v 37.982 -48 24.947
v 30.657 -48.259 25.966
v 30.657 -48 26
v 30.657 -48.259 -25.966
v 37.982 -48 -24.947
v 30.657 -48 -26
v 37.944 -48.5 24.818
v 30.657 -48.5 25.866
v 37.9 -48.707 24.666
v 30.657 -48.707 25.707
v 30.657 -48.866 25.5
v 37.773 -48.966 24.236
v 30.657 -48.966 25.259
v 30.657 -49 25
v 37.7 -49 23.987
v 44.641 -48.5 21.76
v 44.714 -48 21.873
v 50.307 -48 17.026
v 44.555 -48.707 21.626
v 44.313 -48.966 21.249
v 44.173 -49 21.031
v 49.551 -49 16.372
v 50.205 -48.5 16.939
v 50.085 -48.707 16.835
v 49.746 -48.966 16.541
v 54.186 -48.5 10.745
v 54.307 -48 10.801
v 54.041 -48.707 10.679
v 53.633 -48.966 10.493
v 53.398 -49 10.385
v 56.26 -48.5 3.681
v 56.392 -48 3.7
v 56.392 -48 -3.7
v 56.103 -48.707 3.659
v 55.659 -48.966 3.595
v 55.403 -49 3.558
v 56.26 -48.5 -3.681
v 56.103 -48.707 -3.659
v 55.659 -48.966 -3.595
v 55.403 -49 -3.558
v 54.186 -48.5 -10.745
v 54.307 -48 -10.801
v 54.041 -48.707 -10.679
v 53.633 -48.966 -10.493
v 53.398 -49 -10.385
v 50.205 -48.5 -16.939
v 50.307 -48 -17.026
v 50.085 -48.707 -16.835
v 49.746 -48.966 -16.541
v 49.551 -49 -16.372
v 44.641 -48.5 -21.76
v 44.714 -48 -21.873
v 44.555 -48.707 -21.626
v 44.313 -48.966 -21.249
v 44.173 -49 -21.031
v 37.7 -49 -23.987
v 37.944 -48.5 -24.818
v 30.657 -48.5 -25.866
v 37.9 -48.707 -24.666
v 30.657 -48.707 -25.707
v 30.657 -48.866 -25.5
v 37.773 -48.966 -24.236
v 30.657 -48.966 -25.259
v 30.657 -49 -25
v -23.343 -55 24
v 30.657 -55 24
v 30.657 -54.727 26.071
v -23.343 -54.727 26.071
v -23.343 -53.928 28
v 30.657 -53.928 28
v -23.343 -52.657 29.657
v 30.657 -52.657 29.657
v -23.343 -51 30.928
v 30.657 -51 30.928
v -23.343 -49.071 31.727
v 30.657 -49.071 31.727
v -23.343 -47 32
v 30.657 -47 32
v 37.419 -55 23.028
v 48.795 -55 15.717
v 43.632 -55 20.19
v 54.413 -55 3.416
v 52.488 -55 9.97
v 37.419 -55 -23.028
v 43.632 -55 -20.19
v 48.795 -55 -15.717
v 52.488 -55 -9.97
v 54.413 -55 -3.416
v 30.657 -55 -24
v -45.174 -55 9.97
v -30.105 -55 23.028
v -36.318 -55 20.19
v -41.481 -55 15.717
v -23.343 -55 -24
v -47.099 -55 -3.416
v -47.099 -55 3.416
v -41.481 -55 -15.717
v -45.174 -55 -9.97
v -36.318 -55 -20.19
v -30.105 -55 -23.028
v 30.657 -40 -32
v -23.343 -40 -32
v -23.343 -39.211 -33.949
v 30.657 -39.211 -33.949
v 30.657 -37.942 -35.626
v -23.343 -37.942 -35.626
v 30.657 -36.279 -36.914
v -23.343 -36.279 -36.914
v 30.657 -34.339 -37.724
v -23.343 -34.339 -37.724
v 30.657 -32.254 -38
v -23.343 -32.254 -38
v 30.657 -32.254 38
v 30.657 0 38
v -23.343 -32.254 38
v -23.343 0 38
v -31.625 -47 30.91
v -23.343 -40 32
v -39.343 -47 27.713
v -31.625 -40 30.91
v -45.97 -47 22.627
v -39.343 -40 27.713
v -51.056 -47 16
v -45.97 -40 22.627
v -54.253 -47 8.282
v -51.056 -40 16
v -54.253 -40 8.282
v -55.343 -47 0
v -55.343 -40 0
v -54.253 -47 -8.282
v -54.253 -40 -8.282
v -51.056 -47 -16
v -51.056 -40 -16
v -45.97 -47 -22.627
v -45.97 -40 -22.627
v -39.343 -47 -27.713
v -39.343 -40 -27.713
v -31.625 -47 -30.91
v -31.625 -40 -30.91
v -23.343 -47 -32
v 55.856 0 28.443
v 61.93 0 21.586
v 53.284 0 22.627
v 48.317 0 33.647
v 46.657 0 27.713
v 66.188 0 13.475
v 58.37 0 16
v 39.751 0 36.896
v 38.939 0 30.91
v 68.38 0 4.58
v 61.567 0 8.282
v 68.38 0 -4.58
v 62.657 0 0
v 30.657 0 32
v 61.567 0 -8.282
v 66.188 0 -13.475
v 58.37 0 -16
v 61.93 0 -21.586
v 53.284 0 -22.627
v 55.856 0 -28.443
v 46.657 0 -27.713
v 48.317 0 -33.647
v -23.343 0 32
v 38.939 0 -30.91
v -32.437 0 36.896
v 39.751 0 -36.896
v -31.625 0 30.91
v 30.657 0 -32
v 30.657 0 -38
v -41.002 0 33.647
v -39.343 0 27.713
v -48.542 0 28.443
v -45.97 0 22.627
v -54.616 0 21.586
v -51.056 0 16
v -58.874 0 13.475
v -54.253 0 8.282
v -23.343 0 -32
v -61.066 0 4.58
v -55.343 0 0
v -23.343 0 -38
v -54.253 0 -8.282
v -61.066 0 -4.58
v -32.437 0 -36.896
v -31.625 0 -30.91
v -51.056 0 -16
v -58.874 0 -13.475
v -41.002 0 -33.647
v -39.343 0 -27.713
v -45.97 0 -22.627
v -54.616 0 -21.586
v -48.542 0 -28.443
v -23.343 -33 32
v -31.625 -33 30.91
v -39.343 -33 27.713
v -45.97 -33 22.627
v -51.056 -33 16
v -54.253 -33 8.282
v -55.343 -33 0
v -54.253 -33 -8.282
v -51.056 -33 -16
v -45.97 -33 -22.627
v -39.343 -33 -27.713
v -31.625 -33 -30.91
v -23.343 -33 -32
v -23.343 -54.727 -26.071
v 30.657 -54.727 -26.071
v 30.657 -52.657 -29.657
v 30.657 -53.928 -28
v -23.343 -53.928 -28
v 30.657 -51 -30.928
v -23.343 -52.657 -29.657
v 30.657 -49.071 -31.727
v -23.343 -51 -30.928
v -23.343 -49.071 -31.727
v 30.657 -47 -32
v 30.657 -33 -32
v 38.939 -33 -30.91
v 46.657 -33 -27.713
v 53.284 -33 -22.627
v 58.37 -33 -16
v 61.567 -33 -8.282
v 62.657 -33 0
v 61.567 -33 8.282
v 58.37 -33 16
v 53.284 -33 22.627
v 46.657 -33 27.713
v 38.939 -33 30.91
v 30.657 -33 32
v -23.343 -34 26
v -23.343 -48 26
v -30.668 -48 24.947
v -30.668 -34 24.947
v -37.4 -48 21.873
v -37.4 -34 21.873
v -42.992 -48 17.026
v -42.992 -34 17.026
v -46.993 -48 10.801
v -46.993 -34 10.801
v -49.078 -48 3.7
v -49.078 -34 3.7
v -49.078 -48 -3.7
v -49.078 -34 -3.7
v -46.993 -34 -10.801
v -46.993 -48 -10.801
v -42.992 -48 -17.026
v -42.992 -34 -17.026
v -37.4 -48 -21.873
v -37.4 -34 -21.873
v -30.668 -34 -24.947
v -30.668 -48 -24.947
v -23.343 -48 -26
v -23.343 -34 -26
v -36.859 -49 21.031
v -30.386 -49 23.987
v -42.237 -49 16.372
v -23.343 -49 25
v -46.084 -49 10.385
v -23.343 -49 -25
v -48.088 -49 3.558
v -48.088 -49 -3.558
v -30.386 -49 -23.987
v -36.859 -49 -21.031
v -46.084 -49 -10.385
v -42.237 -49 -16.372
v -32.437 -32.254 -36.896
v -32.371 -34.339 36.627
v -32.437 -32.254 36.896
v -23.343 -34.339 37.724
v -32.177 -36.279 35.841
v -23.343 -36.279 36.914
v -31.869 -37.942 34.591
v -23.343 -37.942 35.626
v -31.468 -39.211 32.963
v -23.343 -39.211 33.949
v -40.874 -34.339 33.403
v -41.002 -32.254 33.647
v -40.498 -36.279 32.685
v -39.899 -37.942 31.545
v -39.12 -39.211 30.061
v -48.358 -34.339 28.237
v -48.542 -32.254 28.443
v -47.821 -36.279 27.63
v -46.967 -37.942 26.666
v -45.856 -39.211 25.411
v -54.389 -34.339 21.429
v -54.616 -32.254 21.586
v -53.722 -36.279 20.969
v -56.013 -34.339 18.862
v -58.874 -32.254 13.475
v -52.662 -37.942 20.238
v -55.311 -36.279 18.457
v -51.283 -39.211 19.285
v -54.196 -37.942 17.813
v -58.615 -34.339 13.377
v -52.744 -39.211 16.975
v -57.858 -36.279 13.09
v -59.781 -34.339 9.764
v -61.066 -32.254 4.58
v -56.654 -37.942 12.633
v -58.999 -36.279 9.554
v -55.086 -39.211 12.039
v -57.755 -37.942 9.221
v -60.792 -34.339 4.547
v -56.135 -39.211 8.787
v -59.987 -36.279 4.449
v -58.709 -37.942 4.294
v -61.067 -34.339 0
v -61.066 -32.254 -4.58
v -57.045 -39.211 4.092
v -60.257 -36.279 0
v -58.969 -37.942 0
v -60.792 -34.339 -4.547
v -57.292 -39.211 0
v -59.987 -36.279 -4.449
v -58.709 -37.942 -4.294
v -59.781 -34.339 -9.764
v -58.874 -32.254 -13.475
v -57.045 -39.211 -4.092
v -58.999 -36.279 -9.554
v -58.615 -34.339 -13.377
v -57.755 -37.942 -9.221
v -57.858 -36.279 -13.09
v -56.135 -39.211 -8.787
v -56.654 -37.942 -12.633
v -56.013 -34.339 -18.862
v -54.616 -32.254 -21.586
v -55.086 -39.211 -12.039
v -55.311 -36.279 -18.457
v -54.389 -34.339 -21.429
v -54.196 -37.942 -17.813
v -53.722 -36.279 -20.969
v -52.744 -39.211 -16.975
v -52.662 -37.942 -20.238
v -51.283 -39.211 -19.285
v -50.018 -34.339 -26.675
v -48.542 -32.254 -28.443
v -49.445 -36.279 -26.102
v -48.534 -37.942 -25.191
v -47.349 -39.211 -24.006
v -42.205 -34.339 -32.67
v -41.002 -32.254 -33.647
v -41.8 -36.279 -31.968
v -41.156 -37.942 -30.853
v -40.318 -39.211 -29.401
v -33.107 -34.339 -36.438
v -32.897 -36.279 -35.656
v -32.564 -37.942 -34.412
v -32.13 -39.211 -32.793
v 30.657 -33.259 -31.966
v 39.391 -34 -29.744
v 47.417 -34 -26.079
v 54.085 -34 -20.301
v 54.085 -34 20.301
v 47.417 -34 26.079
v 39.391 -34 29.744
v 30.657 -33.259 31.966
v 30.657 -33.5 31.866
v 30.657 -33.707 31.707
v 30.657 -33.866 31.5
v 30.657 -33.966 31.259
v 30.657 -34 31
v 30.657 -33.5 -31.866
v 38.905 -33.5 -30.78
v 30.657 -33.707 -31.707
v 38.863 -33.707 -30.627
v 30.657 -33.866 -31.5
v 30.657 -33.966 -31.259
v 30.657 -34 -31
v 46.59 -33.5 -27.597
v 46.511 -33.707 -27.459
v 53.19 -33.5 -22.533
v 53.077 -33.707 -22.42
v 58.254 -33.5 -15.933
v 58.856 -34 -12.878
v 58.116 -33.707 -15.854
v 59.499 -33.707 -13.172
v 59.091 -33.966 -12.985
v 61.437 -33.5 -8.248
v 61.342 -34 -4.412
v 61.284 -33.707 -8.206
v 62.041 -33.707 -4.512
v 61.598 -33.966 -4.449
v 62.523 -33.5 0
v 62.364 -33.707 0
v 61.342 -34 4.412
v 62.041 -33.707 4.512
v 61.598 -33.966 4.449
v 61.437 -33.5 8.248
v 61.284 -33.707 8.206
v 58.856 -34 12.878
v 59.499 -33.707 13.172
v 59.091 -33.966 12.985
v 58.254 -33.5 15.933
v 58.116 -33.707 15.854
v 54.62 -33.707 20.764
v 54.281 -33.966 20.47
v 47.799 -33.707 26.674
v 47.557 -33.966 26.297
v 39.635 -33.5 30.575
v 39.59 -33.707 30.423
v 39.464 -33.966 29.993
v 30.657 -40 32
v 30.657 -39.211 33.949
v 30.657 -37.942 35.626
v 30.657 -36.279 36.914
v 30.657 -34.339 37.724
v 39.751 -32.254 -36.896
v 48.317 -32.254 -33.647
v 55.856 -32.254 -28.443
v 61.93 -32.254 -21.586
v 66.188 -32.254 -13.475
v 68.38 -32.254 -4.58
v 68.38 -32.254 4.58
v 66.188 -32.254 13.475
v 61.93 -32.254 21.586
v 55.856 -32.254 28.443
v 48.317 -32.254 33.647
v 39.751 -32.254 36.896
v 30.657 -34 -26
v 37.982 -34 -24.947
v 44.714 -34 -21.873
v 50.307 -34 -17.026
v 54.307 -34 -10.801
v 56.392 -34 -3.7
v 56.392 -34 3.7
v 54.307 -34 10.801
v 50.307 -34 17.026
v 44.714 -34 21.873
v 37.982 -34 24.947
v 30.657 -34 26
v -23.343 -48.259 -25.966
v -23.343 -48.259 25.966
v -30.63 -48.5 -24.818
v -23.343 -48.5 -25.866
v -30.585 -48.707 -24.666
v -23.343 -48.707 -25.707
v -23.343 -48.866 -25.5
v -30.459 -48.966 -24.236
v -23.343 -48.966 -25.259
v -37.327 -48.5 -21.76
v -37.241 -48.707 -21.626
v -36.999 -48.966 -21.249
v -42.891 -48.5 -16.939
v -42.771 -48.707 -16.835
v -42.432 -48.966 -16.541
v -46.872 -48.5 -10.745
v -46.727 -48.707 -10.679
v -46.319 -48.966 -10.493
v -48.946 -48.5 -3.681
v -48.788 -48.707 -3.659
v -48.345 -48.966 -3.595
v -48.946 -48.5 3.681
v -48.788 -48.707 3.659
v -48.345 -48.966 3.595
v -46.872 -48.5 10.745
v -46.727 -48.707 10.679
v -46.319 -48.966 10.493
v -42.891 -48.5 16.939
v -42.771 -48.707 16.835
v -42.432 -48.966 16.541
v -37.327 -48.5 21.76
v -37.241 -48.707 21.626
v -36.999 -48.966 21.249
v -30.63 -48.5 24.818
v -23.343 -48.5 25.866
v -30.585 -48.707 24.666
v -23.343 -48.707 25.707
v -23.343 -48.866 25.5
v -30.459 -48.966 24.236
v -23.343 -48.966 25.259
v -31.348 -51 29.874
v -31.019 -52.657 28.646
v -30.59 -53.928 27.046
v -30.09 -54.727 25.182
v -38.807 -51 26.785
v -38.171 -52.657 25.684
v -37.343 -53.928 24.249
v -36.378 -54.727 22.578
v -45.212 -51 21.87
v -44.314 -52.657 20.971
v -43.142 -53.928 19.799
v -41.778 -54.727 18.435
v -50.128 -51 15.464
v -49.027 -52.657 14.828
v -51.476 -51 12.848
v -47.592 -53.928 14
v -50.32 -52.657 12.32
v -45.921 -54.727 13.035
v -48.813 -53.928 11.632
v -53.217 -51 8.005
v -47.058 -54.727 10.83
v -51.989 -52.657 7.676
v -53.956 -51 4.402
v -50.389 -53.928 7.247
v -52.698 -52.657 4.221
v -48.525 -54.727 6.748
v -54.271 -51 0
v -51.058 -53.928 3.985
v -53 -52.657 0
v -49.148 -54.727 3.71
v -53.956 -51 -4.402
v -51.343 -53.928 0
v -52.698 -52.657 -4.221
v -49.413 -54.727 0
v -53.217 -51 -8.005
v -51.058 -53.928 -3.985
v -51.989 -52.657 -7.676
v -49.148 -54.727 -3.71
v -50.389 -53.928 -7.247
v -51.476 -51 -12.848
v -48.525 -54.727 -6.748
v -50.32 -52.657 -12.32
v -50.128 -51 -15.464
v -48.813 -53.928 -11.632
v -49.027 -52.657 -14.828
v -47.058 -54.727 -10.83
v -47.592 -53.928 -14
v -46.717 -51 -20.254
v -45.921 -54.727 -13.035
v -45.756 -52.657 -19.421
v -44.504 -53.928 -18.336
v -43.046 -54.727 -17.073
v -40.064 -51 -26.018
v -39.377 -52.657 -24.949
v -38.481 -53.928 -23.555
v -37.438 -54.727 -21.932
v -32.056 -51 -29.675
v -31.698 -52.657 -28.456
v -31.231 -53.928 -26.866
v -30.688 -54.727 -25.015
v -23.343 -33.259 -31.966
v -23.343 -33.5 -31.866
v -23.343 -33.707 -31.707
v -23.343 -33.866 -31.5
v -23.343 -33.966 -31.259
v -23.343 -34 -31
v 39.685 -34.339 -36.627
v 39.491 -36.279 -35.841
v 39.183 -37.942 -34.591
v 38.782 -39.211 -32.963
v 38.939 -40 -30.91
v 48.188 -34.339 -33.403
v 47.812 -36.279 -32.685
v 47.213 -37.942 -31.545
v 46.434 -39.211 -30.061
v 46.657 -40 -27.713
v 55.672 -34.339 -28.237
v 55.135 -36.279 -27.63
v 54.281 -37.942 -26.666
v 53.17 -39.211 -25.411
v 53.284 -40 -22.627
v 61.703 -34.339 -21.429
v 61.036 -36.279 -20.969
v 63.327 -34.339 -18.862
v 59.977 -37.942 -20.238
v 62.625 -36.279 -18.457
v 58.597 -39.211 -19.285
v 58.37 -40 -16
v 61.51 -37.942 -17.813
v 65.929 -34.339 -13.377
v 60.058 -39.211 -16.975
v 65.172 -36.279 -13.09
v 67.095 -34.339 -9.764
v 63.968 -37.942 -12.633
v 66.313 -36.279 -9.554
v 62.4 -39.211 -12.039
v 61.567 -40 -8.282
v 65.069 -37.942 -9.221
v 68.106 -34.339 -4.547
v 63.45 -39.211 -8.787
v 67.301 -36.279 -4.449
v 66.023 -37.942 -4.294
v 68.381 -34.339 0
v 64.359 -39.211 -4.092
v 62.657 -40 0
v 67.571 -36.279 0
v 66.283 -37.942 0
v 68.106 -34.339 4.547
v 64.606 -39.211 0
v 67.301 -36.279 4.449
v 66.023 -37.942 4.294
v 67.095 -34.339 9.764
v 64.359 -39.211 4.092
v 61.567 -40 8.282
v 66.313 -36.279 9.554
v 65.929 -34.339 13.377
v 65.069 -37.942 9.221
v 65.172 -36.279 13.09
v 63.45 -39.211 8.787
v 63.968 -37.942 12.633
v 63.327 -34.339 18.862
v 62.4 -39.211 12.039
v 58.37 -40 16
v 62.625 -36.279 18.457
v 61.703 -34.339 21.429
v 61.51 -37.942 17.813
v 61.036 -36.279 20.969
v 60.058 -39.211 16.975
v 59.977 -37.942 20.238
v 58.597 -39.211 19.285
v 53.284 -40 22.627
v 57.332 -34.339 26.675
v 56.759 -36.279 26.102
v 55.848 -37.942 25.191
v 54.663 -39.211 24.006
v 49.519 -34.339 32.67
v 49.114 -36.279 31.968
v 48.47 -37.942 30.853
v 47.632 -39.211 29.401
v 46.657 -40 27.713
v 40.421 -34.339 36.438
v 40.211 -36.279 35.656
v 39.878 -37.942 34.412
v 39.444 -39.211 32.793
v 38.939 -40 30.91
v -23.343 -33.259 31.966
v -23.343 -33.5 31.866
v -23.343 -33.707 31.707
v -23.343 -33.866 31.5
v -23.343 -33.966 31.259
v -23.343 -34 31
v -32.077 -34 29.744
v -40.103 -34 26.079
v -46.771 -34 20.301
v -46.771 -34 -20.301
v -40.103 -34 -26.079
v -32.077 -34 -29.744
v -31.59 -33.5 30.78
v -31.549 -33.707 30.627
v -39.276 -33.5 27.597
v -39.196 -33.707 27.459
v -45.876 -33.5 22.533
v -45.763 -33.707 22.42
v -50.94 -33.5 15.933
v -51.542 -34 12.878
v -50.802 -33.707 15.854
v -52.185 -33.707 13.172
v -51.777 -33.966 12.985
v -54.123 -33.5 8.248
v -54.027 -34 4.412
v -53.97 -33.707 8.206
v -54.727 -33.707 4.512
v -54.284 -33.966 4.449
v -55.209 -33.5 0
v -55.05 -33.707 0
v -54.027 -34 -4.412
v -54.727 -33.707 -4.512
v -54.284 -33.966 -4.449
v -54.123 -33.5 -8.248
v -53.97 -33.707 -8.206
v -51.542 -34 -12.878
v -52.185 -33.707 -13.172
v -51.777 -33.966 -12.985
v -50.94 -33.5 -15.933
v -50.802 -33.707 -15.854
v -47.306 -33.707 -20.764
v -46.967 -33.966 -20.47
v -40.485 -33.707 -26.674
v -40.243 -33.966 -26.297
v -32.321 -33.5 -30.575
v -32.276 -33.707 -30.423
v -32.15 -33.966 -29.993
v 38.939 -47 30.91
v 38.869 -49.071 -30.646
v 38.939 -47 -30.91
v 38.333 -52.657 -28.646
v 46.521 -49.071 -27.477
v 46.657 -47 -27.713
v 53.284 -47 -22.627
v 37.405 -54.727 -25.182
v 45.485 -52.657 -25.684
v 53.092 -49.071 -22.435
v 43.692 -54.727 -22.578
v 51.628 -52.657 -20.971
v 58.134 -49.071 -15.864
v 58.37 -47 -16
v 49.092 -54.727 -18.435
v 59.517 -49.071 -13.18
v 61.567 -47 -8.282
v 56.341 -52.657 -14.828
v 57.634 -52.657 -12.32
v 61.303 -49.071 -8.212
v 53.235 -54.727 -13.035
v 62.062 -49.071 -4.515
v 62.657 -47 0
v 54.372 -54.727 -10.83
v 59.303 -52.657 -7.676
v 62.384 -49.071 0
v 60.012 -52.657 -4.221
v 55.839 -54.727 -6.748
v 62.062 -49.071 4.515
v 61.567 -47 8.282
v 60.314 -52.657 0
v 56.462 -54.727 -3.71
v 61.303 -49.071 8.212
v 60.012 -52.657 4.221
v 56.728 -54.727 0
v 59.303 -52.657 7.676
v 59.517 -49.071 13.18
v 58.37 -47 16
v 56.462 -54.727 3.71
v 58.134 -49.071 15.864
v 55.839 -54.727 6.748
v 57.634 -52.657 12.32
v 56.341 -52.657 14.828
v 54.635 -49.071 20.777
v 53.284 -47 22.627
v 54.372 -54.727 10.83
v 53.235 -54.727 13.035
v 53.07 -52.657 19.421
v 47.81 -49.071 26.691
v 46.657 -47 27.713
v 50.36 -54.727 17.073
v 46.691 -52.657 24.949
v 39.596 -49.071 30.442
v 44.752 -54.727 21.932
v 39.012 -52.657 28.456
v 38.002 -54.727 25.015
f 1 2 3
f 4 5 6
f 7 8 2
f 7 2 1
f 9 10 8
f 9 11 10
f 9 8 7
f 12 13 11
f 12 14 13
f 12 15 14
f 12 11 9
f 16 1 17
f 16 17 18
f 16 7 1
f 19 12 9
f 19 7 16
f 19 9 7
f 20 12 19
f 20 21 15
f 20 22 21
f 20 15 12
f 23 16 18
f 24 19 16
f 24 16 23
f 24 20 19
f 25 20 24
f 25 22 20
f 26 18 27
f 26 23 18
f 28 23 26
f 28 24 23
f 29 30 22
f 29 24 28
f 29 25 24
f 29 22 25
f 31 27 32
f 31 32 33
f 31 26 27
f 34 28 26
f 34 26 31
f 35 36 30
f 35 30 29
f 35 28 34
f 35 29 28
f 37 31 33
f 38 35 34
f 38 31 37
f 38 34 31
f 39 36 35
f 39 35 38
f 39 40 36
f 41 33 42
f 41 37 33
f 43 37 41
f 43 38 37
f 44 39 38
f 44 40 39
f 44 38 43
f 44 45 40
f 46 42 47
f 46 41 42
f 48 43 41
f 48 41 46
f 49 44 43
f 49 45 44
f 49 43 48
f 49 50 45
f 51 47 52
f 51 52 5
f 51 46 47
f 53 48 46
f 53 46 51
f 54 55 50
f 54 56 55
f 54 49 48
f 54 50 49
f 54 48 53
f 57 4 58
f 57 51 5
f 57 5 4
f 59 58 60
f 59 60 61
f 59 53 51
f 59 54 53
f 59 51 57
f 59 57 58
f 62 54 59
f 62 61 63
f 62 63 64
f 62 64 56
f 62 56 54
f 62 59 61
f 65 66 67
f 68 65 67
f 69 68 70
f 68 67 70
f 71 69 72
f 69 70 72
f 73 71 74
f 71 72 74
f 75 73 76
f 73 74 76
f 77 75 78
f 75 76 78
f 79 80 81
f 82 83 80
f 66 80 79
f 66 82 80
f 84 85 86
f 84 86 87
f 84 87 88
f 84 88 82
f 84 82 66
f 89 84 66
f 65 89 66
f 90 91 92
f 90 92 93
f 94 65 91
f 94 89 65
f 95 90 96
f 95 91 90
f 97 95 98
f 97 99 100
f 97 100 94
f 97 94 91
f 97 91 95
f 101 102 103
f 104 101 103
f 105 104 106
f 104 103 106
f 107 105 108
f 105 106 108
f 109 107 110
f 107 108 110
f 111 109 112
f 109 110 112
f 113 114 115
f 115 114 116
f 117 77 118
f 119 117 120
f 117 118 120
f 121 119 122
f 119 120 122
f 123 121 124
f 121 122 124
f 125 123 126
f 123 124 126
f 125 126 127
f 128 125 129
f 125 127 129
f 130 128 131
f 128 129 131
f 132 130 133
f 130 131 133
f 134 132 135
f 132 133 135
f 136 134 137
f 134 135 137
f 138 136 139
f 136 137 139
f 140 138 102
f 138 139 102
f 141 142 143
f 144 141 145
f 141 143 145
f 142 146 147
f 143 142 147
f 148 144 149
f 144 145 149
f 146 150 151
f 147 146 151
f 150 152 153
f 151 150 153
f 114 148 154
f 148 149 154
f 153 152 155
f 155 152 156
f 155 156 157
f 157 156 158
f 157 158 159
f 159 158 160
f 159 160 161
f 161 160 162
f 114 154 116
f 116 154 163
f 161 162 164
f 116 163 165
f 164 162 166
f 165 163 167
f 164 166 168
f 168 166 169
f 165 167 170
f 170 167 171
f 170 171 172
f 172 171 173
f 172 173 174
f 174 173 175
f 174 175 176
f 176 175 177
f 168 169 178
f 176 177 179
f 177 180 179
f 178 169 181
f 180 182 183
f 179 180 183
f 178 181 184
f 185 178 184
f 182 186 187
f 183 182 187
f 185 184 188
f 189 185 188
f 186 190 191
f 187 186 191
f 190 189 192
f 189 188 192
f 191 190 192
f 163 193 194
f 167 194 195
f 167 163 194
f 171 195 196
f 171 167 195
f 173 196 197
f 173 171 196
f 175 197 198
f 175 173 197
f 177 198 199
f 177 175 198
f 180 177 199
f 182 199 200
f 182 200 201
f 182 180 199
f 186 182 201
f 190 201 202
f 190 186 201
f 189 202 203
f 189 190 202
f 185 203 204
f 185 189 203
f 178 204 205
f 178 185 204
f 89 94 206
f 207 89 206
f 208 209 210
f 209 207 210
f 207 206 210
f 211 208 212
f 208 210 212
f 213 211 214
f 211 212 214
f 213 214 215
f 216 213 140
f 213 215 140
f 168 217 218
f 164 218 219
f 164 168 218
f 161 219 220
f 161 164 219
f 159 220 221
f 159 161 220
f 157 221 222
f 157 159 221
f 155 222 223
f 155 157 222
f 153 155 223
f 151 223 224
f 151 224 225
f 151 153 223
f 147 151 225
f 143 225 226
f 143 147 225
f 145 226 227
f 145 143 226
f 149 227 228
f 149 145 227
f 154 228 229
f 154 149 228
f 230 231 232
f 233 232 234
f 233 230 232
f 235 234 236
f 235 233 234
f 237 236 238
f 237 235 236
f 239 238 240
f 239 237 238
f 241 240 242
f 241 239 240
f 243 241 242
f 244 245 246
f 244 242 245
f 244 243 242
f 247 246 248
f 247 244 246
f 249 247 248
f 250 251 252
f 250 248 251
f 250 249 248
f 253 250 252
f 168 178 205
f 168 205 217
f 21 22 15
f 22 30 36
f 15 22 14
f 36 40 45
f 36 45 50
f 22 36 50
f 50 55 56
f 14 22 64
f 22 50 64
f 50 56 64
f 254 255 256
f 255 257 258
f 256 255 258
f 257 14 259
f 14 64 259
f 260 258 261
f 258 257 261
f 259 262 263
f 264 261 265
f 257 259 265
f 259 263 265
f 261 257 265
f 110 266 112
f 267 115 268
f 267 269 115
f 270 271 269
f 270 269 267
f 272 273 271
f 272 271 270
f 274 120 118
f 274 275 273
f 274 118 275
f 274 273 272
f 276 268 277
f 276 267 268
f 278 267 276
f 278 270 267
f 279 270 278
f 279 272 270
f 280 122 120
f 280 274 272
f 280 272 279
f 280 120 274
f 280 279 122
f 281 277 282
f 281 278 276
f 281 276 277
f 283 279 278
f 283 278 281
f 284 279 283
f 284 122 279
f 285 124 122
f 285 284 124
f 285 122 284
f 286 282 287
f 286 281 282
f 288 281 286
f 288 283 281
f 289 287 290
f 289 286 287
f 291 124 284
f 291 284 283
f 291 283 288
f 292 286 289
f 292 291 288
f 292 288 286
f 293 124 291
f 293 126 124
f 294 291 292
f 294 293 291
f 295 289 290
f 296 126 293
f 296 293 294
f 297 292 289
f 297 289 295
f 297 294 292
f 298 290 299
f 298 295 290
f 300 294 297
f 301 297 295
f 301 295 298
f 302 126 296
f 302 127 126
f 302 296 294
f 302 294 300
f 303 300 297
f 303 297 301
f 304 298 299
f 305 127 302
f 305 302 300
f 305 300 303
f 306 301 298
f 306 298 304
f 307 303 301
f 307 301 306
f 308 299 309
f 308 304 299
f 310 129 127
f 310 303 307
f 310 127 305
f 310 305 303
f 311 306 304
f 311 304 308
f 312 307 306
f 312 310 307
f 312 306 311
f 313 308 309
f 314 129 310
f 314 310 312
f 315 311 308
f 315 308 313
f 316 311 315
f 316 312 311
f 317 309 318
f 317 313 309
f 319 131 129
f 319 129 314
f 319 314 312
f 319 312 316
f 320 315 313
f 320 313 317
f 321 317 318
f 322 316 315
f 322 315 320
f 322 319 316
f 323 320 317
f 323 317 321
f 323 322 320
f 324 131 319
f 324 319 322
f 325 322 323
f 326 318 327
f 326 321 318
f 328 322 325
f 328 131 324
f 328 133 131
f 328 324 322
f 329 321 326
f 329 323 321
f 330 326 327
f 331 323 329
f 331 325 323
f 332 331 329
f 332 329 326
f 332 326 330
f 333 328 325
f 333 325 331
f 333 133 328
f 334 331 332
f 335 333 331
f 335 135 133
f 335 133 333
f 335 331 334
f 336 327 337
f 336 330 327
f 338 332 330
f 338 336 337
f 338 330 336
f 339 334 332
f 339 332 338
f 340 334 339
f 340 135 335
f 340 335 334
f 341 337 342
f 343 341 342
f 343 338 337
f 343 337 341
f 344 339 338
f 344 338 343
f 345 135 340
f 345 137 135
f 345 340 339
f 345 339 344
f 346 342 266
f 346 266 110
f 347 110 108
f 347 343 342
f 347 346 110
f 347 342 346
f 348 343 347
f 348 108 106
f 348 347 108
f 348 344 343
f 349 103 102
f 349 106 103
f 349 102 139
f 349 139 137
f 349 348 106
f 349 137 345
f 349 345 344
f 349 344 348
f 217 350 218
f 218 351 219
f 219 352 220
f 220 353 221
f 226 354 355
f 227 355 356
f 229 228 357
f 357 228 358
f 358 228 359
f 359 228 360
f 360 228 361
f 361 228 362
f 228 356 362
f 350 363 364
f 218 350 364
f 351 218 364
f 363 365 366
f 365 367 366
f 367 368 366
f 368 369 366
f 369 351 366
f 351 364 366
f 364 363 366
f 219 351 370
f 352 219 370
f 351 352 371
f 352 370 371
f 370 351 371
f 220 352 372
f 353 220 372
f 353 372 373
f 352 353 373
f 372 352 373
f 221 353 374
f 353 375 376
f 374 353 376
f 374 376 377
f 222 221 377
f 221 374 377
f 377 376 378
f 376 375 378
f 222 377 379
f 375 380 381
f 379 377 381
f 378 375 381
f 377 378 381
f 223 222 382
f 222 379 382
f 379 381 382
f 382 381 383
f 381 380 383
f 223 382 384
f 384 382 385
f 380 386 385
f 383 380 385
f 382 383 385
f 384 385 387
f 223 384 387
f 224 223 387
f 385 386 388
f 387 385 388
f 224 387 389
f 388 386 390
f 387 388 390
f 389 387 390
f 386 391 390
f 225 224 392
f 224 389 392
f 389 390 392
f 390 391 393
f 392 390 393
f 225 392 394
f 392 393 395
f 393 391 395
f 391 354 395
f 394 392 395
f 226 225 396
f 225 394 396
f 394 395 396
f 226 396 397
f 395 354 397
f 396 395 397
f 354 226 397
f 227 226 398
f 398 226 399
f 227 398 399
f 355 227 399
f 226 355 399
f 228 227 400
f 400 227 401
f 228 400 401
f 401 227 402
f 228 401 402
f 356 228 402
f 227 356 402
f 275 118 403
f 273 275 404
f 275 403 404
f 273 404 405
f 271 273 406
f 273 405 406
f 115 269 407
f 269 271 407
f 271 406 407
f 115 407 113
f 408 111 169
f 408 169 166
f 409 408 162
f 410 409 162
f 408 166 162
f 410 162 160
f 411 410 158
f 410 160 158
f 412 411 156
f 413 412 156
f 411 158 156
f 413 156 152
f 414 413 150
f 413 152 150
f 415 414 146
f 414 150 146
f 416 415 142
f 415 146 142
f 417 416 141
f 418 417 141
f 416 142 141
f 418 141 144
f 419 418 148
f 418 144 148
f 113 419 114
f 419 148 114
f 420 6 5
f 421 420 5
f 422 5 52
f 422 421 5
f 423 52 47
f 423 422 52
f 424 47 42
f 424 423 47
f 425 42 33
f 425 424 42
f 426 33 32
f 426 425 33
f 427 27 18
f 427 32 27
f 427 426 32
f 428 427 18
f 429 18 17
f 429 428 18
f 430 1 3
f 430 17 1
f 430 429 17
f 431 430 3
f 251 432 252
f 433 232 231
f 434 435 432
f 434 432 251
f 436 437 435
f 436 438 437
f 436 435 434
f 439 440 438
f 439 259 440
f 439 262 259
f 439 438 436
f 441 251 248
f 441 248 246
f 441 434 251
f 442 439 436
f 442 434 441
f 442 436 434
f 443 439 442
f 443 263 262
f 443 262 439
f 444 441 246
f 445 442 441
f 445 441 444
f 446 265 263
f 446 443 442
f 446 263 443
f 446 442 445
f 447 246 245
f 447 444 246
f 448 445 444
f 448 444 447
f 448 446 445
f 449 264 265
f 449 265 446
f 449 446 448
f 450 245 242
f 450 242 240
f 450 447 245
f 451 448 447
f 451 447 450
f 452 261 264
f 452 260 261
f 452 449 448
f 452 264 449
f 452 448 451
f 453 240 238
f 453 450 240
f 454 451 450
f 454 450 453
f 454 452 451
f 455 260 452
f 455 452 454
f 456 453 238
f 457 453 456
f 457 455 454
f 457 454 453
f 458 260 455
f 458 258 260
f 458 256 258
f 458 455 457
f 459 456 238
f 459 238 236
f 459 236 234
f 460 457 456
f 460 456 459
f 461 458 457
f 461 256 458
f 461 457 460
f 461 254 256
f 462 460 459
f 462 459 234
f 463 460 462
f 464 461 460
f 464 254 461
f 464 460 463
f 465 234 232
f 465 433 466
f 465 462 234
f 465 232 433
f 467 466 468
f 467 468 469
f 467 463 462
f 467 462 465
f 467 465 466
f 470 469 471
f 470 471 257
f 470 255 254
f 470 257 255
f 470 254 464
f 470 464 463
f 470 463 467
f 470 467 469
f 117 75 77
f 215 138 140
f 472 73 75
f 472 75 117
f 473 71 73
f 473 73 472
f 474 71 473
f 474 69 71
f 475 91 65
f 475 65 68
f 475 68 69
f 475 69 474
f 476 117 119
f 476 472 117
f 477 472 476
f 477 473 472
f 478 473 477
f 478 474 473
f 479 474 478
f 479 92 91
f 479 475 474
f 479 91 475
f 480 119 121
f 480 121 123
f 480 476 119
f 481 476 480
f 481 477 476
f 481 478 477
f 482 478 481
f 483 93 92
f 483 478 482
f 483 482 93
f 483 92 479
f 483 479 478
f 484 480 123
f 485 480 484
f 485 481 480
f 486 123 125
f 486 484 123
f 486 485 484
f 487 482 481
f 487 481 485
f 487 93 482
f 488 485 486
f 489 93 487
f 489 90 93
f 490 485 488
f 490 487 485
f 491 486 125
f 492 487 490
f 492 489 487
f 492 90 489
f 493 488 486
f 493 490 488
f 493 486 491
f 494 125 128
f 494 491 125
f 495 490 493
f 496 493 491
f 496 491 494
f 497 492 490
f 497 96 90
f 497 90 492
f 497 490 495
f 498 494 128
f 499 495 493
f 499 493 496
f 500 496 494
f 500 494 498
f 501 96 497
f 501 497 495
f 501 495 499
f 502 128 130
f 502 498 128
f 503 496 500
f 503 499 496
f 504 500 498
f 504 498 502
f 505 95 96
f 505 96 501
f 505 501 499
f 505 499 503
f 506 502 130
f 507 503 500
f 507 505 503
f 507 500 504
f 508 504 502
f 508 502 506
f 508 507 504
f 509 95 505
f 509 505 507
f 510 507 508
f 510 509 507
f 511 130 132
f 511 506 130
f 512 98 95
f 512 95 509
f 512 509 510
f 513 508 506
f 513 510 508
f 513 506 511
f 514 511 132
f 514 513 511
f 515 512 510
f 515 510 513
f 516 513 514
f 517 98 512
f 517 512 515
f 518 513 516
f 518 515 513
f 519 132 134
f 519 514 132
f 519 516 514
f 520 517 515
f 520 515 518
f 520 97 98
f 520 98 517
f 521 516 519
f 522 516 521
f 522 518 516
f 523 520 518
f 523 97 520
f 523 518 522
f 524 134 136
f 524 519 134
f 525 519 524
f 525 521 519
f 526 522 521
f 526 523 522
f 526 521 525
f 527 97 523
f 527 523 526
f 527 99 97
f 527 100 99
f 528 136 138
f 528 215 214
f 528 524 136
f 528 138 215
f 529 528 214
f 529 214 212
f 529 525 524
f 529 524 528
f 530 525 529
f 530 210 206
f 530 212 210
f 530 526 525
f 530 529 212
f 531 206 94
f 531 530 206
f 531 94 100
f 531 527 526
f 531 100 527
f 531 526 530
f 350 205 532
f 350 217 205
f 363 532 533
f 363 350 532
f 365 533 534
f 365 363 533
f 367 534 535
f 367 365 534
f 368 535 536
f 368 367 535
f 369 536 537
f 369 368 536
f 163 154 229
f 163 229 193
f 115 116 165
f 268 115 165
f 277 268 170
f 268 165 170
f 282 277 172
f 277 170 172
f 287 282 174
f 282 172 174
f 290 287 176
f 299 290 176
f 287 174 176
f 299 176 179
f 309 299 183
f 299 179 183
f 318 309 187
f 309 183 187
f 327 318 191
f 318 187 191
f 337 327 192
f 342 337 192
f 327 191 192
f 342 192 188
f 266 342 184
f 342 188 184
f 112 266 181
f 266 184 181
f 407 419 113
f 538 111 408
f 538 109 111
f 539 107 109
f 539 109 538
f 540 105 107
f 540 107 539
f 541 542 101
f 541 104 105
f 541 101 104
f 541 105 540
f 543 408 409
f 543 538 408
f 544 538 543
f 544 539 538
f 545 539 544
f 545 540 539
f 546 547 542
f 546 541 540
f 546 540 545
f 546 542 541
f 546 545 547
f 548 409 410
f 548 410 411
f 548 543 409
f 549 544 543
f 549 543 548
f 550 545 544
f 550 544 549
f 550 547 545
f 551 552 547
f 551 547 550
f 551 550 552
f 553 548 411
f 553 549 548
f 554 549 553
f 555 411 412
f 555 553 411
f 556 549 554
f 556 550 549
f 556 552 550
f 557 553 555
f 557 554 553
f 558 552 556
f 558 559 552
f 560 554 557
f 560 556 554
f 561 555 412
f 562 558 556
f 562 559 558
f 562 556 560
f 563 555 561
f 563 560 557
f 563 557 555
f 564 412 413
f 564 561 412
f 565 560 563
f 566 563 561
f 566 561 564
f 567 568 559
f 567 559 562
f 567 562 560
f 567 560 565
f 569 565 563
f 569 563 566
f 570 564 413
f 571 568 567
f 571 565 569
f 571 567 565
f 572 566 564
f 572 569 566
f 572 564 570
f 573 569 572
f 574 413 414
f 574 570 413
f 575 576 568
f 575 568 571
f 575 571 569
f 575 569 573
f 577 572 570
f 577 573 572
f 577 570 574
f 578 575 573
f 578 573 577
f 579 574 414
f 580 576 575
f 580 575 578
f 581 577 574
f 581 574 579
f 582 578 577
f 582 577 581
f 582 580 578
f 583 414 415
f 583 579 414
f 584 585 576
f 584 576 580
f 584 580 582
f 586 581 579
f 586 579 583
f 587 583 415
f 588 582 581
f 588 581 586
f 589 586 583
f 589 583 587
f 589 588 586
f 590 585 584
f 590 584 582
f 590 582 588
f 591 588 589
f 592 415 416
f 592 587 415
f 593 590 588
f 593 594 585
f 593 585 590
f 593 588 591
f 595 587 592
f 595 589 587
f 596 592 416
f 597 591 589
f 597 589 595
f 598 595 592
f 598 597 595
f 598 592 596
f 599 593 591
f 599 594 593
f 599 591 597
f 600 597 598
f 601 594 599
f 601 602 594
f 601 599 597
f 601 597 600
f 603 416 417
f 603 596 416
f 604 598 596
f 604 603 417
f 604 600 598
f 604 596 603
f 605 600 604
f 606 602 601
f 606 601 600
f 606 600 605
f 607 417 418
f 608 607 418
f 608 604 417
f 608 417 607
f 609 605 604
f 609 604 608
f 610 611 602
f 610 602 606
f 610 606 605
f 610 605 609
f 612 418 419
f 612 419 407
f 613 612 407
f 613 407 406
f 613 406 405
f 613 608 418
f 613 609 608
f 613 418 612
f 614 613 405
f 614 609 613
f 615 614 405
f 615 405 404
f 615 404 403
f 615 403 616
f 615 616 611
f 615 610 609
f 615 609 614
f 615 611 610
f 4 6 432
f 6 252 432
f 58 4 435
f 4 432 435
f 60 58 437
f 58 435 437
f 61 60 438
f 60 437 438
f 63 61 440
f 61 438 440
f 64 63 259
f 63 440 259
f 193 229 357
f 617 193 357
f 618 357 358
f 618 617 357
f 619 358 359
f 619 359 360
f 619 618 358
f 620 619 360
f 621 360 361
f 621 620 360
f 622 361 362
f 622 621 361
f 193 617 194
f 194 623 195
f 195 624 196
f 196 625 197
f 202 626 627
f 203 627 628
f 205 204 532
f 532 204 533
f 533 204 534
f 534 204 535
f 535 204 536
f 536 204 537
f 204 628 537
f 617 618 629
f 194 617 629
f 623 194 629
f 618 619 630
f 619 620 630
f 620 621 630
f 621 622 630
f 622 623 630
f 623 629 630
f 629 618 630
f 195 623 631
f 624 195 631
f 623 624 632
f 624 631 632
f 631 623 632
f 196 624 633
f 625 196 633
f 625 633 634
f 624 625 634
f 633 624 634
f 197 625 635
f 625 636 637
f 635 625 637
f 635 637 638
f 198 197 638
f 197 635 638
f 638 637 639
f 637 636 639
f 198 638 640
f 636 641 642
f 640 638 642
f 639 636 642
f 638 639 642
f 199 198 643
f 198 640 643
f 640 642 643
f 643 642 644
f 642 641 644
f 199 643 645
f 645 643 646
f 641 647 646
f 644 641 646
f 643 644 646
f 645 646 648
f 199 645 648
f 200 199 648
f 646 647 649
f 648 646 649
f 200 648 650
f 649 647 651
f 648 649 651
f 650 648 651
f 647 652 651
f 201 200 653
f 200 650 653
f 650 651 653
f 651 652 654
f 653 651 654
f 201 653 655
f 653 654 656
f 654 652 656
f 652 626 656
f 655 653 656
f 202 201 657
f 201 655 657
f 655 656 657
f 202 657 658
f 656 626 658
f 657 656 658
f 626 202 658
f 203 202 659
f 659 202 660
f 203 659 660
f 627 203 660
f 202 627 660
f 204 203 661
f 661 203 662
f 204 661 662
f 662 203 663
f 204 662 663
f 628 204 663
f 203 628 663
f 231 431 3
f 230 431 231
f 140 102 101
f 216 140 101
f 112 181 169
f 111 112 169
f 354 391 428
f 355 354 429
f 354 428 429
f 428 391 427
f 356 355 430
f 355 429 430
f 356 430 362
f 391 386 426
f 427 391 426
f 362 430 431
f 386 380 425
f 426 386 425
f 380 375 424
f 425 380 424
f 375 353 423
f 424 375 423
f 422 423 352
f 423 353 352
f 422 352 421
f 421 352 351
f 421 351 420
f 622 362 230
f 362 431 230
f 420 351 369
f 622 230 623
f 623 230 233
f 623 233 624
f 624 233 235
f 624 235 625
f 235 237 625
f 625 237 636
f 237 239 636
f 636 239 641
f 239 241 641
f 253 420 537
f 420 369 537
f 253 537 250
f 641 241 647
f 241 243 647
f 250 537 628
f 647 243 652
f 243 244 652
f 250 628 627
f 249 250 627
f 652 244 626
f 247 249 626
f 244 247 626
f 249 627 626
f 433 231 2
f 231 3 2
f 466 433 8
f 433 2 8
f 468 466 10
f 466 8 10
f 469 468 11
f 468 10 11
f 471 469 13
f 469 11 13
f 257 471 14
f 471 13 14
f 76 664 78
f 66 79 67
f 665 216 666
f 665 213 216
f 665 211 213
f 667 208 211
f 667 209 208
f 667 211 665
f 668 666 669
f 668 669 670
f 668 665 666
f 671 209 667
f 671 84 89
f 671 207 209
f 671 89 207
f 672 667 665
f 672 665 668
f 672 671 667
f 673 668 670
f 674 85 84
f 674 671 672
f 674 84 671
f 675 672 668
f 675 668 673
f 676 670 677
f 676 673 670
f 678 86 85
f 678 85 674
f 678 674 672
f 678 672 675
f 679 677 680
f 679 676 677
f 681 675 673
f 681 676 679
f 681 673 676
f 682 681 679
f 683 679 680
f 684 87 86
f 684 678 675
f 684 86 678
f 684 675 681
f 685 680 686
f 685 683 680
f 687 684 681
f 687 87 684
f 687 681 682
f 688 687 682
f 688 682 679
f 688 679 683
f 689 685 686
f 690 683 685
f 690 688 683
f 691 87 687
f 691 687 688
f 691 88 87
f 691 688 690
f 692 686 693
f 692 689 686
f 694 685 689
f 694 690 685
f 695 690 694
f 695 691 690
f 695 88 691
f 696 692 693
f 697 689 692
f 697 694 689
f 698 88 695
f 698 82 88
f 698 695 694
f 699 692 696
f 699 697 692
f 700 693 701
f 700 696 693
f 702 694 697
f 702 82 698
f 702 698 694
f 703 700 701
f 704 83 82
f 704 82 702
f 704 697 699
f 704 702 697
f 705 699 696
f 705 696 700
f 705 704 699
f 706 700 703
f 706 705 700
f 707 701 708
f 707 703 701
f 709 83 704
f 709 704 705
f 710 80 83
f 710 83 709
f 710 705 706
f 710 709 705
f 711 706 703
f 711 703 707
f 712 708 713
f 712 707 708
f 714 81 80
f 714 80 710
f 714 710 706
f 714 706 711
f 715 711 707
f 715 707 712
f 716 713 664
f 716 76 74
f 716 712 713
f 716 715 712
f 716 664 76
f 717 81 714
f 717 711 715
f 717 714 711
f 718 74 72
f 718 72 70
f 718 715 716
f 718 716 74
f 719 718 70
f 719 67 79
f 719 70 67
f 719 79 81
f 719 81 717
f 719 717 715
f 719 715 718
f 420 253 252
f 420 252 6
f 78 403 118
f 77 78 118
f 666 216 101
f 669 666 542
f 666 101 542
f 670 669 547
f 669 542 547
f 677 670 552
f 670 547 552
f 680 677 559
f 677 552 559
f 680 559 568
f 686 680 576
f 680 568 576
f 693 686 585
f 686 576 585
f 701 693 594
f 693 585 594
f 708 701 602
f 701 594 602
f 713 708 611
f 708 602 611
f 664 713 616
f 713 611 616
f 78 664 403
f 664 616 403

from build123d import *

# Parameters (mm, degrees)
EXTRUDE_1_DEPTH = 40
EXTRUDE_2_DEPTH = 55
SHELL_1_T       = -6
FILLET_1_R      = 8
FILLET_3_R      = 1


with BuildPart() as part:
    # 스케치1 → 보스-돌출1 (new body)
    with BuildSketch(Plane(origin=(0, 0, 0), x_dir=(1, 0, 0), z_dir=(0, 1, 0))):
        with BuildLine():
            Line((-23.342939481, 38), (30.657060519, 38))
            ThreePointArc((30.657060519, 38), (68.657060519, 0), (30.657060519, -38))
            Line((30.657060519, -38), (-23.342939481, -38))
            ThreePointArc((-23.342939481, -38), (-61.342939481, 0), (-23.342939481, 38))
        make_face()
    extrude(amount=-EXTRUDE_1_DEPTH)

    # 스케치1<3> → 보스-돌출2 (add)
    with BuildSketch(Plane(origin=(0, 0, 0), x_dir=(1, 0, 0), z_dir=(0, 1, 0))):
        with BuildLine():
            Line((-23.342939481, 32), (30.657060519, 32))
            ThreePointArc((30.657060519, 32), (62.657060519, 0), (30.657060519, -32))
            Line((30.657060519, -32), (-23.342939481, -32))
            ThreePointArc((-23.342939481, -32), (-55.342939481, 0), (-23.342939481, 32))
        make_face()
    extrude(amount=-EXTRUDE_2_DEPTH)

    # 쉘1
    shell_1_openings = [part.faces().sort_by_distance(p)[0] for p in [
        (3.657060519, 0, 0),
    ]]
    offset(amount=SHELL_1_T, openings=shell_1_openings, kind=Kind.INTERSECTION)

    # 필렛1
    # the kernel refuses this fillet: 8 mm, written as the material it takes off along each edge
    with BuildSketch(Plane(origin=(30.657060519, -40, 0), x_dir=(0, 0, -1), z_dir=(-1, 0, 0))) as fillet_1_piece_1:
        with BuildLine():
            CenterArc((30, -7.745966692), FILLET_1_R, 0, 75.522487814)
            Line((32, 0), (32.04, 0.154919334))
            ThreePointArc((32.04, 0.154919334), (35, 0.16), (38, 0.16))
            Line((38, 0.16), (38.16, 0))
            Line((38.16, 0), (38.16, -7.745966692))
            Line((38.16, -7.745966692), (38, -7.745966692))
        make_face()
    revolve(axis=Axis((30.657060519, -40, 0), (0, -1, 0)), revolution_arc=180, mode=Mode.SUBTRACT)
    with BuildSketch(Plane(origin=(-23.342939481, -40, -38), x_dir=(0, 0, 1), z_dir=(1, 0, 0))) as fillet_1_piece_2:
        with BuildLine():
            CenterArc((8, -7.745966692), FILLET_1_R, 104.477512186, 75.522487814)
            Line((0, -7.745966692), (-0.16, -7.745966692))
            Line((-0.16, -7.745966692), (-0.16, 0))
            Line((-0.16, 0), (0, 0.16))
            ThreePointArc((0, 0.16), (3, 0.16), (5.96, 0.154919334))
            Line((5.96, 0.154919334), (6, 0))
        make_face()
    extrude(amount=54, mode=Mode.SUBTRACT)
    with BuildSketch(Plane(origin=(30.657060519, -55, 0), x_dir=(0, 0, -1), z_dir=(-1, 0, 0))) as fillet_1_piece_3:
        with BuildLine():
            CenterArc((32 - FILLET_1_R, -FILLET_1_R), FILLET_1_R, 0, 90)
            Line((32 - FILLET_1_R, 0), (32 - FILLET_1_R, FILLET_1_R * 0.02))
            Line((32 - FILLET_1_R, FILLET_1_R * 0.02), (32 + FILLET_1_R * 0.02, FILLET_1_R * 0.02))
            Line((32 + FILLET_1_R * 0.02, FILLET_1_R * 0.02), (32 + FILLET_1_R * 0.02, -FILLET_1_R))
            Line((32 + FILLET_1_R * 0.02, -FILLET_1_R), (32, -FILLET_1_R))
        make_face()
    revolve(axis=Axis((30.657060519, -55, 0), (0, -1, 0)), revolution_arc=180, mode=Mode.SUBTRACT)
    with BuildSketch(Plane(origin=(30.657060519, -55, 32), x_dir=(0, 1, 0), z_dir=(-1, 0, 0)), Plane(origin=(-23.342939481, -55, -32), x_dir=(0, 1, 0), z_dir=(1, 0, 0))) as fillet_1_piece_4:
        with BuildLine():
            CenterArc((FILLET_1_R, FILLET_1_R), FILLET_1_R, 180, 90)
            Line((0, FILLET_1_R), (-FILLET_1_R * 0.02, FILLET_1_R))
            Line((-FILLET_1_R * 0.02, FILLET_1_R), (-FILLET_1_R * 0.02, -FILLET_1_R * 0.02))
            Line((-FILLET_1_R * 0.02, -FILLET_1_R * 0.02), (FILLET_1_R, -FILLET_1_R * 0.02))
            Line((FILLET_1_R, -FILLET_1_R * 0.02), (FILLET_1_R, 0))
        make_face()
    extrude(amount=54, mode=Mode.SUBTRACT)
    with BuildSketch(Plane(origin=(-23.342939481, -55, 0), x_dir=(0, 0, 1), z_dir=(1, 0, 0))) as fillet_1_piece_5:
        with BuildLine():
            CenterArc((32 - FILLET_1_R, -FILLET_1_R), FILLET_1_R, 0, 90)
            Line((32 - FILLET_1_R, 0), (32 - FILLET_1_R, FILLET_1_R * 0.02))
            Line((32 - FILLET_1_R, FILLET_1_R * 0.02), (32 + FILLET_1_R * 0.02, FILLET_1_R * 0.02))
            Line((32 + FILLET_1_R * 0.02, FILLET_1_R * 0.02), (32 + FILLET_1_R * 0.02, -FILLET_1_R))
            Line((32 + FILLET_1_R * 0.02, -FILLET_1_R), (32, -FILLET_1_R))
        make_face()
    revolve(axis=Axis((-23.342939481, -55, 0), (0, -1, 0)), revolution_arc=180, mode=Mode.SUBTRACT)
    with BuildSketch(Plane(origin=(-23.342939481, -40, 0), x_dir=(0, 0, 1), z_dir=(1, 0, 0))) as fillet_1_piece_6:
        with BuildLine():
            CenterArc((30, -7.745966692), FILLET_1_R, 0, 75.522487814)
            Line((32, 0), (32.04, 0.154919334))
            ThreePointArc((32.04, 0.154919334), (35, 0.16), (38, 0.16))
            Line((38, 0.16), (38.16, 0))
            Line((38.16, 0), (38.16, -7.745966692))
            Line((38.16, -7.745966692), (38, -7.745966692))
        make_face()
    revolve(axis=Axis((-23.342939481, -40, 0), (0, -1, 0)), revolution_arc=180, mode=Mode.SUBTRACT)
    with BuildSketch(Plane(origin=(30.657060519, -40, 38), x_dir=(0, 1, 0), z_dir=(-1, 0, 0))) as fillet_1_piece_7:
        with BuildLine():
            CenterArc((7.745966692, 8), FILLET_1_R, 194.477512186, 75.522487814)
            Line((0, 6), (-0.154919334, 5.96))
            ThreePointArc((-0.154919334, 5.96), (-0.16, 3), (-0.16, 0))
            Line((-0.16, 0), (0, -0.16))
            Line((0, -0.16), (7.745966692, -0.16))
            Line((7.745966692, -0.16), (7.745966692, 0))
        make_face()
    extrude(amount=54, mode=Mode.SUBTRACT)

    # 필렛3
    fillet_3_edges = [part.edges().sort_by_distance(p)[0] for p in [
        (3.657060519, -34, -32),
        (-55.342939481, -34, 0),
        (62.657060519, -34, 0),
        (3.657060519, -34, 32),
        (56.657060519, -49, 0),
        (3.657060519, -49, 26),
        (-49.342939481, -49, 0),
        (3.657060519, -49, -26),
    ]]
    fillet(fillet_3_edges, radius=FILLET_3_R)


solid = part.part
